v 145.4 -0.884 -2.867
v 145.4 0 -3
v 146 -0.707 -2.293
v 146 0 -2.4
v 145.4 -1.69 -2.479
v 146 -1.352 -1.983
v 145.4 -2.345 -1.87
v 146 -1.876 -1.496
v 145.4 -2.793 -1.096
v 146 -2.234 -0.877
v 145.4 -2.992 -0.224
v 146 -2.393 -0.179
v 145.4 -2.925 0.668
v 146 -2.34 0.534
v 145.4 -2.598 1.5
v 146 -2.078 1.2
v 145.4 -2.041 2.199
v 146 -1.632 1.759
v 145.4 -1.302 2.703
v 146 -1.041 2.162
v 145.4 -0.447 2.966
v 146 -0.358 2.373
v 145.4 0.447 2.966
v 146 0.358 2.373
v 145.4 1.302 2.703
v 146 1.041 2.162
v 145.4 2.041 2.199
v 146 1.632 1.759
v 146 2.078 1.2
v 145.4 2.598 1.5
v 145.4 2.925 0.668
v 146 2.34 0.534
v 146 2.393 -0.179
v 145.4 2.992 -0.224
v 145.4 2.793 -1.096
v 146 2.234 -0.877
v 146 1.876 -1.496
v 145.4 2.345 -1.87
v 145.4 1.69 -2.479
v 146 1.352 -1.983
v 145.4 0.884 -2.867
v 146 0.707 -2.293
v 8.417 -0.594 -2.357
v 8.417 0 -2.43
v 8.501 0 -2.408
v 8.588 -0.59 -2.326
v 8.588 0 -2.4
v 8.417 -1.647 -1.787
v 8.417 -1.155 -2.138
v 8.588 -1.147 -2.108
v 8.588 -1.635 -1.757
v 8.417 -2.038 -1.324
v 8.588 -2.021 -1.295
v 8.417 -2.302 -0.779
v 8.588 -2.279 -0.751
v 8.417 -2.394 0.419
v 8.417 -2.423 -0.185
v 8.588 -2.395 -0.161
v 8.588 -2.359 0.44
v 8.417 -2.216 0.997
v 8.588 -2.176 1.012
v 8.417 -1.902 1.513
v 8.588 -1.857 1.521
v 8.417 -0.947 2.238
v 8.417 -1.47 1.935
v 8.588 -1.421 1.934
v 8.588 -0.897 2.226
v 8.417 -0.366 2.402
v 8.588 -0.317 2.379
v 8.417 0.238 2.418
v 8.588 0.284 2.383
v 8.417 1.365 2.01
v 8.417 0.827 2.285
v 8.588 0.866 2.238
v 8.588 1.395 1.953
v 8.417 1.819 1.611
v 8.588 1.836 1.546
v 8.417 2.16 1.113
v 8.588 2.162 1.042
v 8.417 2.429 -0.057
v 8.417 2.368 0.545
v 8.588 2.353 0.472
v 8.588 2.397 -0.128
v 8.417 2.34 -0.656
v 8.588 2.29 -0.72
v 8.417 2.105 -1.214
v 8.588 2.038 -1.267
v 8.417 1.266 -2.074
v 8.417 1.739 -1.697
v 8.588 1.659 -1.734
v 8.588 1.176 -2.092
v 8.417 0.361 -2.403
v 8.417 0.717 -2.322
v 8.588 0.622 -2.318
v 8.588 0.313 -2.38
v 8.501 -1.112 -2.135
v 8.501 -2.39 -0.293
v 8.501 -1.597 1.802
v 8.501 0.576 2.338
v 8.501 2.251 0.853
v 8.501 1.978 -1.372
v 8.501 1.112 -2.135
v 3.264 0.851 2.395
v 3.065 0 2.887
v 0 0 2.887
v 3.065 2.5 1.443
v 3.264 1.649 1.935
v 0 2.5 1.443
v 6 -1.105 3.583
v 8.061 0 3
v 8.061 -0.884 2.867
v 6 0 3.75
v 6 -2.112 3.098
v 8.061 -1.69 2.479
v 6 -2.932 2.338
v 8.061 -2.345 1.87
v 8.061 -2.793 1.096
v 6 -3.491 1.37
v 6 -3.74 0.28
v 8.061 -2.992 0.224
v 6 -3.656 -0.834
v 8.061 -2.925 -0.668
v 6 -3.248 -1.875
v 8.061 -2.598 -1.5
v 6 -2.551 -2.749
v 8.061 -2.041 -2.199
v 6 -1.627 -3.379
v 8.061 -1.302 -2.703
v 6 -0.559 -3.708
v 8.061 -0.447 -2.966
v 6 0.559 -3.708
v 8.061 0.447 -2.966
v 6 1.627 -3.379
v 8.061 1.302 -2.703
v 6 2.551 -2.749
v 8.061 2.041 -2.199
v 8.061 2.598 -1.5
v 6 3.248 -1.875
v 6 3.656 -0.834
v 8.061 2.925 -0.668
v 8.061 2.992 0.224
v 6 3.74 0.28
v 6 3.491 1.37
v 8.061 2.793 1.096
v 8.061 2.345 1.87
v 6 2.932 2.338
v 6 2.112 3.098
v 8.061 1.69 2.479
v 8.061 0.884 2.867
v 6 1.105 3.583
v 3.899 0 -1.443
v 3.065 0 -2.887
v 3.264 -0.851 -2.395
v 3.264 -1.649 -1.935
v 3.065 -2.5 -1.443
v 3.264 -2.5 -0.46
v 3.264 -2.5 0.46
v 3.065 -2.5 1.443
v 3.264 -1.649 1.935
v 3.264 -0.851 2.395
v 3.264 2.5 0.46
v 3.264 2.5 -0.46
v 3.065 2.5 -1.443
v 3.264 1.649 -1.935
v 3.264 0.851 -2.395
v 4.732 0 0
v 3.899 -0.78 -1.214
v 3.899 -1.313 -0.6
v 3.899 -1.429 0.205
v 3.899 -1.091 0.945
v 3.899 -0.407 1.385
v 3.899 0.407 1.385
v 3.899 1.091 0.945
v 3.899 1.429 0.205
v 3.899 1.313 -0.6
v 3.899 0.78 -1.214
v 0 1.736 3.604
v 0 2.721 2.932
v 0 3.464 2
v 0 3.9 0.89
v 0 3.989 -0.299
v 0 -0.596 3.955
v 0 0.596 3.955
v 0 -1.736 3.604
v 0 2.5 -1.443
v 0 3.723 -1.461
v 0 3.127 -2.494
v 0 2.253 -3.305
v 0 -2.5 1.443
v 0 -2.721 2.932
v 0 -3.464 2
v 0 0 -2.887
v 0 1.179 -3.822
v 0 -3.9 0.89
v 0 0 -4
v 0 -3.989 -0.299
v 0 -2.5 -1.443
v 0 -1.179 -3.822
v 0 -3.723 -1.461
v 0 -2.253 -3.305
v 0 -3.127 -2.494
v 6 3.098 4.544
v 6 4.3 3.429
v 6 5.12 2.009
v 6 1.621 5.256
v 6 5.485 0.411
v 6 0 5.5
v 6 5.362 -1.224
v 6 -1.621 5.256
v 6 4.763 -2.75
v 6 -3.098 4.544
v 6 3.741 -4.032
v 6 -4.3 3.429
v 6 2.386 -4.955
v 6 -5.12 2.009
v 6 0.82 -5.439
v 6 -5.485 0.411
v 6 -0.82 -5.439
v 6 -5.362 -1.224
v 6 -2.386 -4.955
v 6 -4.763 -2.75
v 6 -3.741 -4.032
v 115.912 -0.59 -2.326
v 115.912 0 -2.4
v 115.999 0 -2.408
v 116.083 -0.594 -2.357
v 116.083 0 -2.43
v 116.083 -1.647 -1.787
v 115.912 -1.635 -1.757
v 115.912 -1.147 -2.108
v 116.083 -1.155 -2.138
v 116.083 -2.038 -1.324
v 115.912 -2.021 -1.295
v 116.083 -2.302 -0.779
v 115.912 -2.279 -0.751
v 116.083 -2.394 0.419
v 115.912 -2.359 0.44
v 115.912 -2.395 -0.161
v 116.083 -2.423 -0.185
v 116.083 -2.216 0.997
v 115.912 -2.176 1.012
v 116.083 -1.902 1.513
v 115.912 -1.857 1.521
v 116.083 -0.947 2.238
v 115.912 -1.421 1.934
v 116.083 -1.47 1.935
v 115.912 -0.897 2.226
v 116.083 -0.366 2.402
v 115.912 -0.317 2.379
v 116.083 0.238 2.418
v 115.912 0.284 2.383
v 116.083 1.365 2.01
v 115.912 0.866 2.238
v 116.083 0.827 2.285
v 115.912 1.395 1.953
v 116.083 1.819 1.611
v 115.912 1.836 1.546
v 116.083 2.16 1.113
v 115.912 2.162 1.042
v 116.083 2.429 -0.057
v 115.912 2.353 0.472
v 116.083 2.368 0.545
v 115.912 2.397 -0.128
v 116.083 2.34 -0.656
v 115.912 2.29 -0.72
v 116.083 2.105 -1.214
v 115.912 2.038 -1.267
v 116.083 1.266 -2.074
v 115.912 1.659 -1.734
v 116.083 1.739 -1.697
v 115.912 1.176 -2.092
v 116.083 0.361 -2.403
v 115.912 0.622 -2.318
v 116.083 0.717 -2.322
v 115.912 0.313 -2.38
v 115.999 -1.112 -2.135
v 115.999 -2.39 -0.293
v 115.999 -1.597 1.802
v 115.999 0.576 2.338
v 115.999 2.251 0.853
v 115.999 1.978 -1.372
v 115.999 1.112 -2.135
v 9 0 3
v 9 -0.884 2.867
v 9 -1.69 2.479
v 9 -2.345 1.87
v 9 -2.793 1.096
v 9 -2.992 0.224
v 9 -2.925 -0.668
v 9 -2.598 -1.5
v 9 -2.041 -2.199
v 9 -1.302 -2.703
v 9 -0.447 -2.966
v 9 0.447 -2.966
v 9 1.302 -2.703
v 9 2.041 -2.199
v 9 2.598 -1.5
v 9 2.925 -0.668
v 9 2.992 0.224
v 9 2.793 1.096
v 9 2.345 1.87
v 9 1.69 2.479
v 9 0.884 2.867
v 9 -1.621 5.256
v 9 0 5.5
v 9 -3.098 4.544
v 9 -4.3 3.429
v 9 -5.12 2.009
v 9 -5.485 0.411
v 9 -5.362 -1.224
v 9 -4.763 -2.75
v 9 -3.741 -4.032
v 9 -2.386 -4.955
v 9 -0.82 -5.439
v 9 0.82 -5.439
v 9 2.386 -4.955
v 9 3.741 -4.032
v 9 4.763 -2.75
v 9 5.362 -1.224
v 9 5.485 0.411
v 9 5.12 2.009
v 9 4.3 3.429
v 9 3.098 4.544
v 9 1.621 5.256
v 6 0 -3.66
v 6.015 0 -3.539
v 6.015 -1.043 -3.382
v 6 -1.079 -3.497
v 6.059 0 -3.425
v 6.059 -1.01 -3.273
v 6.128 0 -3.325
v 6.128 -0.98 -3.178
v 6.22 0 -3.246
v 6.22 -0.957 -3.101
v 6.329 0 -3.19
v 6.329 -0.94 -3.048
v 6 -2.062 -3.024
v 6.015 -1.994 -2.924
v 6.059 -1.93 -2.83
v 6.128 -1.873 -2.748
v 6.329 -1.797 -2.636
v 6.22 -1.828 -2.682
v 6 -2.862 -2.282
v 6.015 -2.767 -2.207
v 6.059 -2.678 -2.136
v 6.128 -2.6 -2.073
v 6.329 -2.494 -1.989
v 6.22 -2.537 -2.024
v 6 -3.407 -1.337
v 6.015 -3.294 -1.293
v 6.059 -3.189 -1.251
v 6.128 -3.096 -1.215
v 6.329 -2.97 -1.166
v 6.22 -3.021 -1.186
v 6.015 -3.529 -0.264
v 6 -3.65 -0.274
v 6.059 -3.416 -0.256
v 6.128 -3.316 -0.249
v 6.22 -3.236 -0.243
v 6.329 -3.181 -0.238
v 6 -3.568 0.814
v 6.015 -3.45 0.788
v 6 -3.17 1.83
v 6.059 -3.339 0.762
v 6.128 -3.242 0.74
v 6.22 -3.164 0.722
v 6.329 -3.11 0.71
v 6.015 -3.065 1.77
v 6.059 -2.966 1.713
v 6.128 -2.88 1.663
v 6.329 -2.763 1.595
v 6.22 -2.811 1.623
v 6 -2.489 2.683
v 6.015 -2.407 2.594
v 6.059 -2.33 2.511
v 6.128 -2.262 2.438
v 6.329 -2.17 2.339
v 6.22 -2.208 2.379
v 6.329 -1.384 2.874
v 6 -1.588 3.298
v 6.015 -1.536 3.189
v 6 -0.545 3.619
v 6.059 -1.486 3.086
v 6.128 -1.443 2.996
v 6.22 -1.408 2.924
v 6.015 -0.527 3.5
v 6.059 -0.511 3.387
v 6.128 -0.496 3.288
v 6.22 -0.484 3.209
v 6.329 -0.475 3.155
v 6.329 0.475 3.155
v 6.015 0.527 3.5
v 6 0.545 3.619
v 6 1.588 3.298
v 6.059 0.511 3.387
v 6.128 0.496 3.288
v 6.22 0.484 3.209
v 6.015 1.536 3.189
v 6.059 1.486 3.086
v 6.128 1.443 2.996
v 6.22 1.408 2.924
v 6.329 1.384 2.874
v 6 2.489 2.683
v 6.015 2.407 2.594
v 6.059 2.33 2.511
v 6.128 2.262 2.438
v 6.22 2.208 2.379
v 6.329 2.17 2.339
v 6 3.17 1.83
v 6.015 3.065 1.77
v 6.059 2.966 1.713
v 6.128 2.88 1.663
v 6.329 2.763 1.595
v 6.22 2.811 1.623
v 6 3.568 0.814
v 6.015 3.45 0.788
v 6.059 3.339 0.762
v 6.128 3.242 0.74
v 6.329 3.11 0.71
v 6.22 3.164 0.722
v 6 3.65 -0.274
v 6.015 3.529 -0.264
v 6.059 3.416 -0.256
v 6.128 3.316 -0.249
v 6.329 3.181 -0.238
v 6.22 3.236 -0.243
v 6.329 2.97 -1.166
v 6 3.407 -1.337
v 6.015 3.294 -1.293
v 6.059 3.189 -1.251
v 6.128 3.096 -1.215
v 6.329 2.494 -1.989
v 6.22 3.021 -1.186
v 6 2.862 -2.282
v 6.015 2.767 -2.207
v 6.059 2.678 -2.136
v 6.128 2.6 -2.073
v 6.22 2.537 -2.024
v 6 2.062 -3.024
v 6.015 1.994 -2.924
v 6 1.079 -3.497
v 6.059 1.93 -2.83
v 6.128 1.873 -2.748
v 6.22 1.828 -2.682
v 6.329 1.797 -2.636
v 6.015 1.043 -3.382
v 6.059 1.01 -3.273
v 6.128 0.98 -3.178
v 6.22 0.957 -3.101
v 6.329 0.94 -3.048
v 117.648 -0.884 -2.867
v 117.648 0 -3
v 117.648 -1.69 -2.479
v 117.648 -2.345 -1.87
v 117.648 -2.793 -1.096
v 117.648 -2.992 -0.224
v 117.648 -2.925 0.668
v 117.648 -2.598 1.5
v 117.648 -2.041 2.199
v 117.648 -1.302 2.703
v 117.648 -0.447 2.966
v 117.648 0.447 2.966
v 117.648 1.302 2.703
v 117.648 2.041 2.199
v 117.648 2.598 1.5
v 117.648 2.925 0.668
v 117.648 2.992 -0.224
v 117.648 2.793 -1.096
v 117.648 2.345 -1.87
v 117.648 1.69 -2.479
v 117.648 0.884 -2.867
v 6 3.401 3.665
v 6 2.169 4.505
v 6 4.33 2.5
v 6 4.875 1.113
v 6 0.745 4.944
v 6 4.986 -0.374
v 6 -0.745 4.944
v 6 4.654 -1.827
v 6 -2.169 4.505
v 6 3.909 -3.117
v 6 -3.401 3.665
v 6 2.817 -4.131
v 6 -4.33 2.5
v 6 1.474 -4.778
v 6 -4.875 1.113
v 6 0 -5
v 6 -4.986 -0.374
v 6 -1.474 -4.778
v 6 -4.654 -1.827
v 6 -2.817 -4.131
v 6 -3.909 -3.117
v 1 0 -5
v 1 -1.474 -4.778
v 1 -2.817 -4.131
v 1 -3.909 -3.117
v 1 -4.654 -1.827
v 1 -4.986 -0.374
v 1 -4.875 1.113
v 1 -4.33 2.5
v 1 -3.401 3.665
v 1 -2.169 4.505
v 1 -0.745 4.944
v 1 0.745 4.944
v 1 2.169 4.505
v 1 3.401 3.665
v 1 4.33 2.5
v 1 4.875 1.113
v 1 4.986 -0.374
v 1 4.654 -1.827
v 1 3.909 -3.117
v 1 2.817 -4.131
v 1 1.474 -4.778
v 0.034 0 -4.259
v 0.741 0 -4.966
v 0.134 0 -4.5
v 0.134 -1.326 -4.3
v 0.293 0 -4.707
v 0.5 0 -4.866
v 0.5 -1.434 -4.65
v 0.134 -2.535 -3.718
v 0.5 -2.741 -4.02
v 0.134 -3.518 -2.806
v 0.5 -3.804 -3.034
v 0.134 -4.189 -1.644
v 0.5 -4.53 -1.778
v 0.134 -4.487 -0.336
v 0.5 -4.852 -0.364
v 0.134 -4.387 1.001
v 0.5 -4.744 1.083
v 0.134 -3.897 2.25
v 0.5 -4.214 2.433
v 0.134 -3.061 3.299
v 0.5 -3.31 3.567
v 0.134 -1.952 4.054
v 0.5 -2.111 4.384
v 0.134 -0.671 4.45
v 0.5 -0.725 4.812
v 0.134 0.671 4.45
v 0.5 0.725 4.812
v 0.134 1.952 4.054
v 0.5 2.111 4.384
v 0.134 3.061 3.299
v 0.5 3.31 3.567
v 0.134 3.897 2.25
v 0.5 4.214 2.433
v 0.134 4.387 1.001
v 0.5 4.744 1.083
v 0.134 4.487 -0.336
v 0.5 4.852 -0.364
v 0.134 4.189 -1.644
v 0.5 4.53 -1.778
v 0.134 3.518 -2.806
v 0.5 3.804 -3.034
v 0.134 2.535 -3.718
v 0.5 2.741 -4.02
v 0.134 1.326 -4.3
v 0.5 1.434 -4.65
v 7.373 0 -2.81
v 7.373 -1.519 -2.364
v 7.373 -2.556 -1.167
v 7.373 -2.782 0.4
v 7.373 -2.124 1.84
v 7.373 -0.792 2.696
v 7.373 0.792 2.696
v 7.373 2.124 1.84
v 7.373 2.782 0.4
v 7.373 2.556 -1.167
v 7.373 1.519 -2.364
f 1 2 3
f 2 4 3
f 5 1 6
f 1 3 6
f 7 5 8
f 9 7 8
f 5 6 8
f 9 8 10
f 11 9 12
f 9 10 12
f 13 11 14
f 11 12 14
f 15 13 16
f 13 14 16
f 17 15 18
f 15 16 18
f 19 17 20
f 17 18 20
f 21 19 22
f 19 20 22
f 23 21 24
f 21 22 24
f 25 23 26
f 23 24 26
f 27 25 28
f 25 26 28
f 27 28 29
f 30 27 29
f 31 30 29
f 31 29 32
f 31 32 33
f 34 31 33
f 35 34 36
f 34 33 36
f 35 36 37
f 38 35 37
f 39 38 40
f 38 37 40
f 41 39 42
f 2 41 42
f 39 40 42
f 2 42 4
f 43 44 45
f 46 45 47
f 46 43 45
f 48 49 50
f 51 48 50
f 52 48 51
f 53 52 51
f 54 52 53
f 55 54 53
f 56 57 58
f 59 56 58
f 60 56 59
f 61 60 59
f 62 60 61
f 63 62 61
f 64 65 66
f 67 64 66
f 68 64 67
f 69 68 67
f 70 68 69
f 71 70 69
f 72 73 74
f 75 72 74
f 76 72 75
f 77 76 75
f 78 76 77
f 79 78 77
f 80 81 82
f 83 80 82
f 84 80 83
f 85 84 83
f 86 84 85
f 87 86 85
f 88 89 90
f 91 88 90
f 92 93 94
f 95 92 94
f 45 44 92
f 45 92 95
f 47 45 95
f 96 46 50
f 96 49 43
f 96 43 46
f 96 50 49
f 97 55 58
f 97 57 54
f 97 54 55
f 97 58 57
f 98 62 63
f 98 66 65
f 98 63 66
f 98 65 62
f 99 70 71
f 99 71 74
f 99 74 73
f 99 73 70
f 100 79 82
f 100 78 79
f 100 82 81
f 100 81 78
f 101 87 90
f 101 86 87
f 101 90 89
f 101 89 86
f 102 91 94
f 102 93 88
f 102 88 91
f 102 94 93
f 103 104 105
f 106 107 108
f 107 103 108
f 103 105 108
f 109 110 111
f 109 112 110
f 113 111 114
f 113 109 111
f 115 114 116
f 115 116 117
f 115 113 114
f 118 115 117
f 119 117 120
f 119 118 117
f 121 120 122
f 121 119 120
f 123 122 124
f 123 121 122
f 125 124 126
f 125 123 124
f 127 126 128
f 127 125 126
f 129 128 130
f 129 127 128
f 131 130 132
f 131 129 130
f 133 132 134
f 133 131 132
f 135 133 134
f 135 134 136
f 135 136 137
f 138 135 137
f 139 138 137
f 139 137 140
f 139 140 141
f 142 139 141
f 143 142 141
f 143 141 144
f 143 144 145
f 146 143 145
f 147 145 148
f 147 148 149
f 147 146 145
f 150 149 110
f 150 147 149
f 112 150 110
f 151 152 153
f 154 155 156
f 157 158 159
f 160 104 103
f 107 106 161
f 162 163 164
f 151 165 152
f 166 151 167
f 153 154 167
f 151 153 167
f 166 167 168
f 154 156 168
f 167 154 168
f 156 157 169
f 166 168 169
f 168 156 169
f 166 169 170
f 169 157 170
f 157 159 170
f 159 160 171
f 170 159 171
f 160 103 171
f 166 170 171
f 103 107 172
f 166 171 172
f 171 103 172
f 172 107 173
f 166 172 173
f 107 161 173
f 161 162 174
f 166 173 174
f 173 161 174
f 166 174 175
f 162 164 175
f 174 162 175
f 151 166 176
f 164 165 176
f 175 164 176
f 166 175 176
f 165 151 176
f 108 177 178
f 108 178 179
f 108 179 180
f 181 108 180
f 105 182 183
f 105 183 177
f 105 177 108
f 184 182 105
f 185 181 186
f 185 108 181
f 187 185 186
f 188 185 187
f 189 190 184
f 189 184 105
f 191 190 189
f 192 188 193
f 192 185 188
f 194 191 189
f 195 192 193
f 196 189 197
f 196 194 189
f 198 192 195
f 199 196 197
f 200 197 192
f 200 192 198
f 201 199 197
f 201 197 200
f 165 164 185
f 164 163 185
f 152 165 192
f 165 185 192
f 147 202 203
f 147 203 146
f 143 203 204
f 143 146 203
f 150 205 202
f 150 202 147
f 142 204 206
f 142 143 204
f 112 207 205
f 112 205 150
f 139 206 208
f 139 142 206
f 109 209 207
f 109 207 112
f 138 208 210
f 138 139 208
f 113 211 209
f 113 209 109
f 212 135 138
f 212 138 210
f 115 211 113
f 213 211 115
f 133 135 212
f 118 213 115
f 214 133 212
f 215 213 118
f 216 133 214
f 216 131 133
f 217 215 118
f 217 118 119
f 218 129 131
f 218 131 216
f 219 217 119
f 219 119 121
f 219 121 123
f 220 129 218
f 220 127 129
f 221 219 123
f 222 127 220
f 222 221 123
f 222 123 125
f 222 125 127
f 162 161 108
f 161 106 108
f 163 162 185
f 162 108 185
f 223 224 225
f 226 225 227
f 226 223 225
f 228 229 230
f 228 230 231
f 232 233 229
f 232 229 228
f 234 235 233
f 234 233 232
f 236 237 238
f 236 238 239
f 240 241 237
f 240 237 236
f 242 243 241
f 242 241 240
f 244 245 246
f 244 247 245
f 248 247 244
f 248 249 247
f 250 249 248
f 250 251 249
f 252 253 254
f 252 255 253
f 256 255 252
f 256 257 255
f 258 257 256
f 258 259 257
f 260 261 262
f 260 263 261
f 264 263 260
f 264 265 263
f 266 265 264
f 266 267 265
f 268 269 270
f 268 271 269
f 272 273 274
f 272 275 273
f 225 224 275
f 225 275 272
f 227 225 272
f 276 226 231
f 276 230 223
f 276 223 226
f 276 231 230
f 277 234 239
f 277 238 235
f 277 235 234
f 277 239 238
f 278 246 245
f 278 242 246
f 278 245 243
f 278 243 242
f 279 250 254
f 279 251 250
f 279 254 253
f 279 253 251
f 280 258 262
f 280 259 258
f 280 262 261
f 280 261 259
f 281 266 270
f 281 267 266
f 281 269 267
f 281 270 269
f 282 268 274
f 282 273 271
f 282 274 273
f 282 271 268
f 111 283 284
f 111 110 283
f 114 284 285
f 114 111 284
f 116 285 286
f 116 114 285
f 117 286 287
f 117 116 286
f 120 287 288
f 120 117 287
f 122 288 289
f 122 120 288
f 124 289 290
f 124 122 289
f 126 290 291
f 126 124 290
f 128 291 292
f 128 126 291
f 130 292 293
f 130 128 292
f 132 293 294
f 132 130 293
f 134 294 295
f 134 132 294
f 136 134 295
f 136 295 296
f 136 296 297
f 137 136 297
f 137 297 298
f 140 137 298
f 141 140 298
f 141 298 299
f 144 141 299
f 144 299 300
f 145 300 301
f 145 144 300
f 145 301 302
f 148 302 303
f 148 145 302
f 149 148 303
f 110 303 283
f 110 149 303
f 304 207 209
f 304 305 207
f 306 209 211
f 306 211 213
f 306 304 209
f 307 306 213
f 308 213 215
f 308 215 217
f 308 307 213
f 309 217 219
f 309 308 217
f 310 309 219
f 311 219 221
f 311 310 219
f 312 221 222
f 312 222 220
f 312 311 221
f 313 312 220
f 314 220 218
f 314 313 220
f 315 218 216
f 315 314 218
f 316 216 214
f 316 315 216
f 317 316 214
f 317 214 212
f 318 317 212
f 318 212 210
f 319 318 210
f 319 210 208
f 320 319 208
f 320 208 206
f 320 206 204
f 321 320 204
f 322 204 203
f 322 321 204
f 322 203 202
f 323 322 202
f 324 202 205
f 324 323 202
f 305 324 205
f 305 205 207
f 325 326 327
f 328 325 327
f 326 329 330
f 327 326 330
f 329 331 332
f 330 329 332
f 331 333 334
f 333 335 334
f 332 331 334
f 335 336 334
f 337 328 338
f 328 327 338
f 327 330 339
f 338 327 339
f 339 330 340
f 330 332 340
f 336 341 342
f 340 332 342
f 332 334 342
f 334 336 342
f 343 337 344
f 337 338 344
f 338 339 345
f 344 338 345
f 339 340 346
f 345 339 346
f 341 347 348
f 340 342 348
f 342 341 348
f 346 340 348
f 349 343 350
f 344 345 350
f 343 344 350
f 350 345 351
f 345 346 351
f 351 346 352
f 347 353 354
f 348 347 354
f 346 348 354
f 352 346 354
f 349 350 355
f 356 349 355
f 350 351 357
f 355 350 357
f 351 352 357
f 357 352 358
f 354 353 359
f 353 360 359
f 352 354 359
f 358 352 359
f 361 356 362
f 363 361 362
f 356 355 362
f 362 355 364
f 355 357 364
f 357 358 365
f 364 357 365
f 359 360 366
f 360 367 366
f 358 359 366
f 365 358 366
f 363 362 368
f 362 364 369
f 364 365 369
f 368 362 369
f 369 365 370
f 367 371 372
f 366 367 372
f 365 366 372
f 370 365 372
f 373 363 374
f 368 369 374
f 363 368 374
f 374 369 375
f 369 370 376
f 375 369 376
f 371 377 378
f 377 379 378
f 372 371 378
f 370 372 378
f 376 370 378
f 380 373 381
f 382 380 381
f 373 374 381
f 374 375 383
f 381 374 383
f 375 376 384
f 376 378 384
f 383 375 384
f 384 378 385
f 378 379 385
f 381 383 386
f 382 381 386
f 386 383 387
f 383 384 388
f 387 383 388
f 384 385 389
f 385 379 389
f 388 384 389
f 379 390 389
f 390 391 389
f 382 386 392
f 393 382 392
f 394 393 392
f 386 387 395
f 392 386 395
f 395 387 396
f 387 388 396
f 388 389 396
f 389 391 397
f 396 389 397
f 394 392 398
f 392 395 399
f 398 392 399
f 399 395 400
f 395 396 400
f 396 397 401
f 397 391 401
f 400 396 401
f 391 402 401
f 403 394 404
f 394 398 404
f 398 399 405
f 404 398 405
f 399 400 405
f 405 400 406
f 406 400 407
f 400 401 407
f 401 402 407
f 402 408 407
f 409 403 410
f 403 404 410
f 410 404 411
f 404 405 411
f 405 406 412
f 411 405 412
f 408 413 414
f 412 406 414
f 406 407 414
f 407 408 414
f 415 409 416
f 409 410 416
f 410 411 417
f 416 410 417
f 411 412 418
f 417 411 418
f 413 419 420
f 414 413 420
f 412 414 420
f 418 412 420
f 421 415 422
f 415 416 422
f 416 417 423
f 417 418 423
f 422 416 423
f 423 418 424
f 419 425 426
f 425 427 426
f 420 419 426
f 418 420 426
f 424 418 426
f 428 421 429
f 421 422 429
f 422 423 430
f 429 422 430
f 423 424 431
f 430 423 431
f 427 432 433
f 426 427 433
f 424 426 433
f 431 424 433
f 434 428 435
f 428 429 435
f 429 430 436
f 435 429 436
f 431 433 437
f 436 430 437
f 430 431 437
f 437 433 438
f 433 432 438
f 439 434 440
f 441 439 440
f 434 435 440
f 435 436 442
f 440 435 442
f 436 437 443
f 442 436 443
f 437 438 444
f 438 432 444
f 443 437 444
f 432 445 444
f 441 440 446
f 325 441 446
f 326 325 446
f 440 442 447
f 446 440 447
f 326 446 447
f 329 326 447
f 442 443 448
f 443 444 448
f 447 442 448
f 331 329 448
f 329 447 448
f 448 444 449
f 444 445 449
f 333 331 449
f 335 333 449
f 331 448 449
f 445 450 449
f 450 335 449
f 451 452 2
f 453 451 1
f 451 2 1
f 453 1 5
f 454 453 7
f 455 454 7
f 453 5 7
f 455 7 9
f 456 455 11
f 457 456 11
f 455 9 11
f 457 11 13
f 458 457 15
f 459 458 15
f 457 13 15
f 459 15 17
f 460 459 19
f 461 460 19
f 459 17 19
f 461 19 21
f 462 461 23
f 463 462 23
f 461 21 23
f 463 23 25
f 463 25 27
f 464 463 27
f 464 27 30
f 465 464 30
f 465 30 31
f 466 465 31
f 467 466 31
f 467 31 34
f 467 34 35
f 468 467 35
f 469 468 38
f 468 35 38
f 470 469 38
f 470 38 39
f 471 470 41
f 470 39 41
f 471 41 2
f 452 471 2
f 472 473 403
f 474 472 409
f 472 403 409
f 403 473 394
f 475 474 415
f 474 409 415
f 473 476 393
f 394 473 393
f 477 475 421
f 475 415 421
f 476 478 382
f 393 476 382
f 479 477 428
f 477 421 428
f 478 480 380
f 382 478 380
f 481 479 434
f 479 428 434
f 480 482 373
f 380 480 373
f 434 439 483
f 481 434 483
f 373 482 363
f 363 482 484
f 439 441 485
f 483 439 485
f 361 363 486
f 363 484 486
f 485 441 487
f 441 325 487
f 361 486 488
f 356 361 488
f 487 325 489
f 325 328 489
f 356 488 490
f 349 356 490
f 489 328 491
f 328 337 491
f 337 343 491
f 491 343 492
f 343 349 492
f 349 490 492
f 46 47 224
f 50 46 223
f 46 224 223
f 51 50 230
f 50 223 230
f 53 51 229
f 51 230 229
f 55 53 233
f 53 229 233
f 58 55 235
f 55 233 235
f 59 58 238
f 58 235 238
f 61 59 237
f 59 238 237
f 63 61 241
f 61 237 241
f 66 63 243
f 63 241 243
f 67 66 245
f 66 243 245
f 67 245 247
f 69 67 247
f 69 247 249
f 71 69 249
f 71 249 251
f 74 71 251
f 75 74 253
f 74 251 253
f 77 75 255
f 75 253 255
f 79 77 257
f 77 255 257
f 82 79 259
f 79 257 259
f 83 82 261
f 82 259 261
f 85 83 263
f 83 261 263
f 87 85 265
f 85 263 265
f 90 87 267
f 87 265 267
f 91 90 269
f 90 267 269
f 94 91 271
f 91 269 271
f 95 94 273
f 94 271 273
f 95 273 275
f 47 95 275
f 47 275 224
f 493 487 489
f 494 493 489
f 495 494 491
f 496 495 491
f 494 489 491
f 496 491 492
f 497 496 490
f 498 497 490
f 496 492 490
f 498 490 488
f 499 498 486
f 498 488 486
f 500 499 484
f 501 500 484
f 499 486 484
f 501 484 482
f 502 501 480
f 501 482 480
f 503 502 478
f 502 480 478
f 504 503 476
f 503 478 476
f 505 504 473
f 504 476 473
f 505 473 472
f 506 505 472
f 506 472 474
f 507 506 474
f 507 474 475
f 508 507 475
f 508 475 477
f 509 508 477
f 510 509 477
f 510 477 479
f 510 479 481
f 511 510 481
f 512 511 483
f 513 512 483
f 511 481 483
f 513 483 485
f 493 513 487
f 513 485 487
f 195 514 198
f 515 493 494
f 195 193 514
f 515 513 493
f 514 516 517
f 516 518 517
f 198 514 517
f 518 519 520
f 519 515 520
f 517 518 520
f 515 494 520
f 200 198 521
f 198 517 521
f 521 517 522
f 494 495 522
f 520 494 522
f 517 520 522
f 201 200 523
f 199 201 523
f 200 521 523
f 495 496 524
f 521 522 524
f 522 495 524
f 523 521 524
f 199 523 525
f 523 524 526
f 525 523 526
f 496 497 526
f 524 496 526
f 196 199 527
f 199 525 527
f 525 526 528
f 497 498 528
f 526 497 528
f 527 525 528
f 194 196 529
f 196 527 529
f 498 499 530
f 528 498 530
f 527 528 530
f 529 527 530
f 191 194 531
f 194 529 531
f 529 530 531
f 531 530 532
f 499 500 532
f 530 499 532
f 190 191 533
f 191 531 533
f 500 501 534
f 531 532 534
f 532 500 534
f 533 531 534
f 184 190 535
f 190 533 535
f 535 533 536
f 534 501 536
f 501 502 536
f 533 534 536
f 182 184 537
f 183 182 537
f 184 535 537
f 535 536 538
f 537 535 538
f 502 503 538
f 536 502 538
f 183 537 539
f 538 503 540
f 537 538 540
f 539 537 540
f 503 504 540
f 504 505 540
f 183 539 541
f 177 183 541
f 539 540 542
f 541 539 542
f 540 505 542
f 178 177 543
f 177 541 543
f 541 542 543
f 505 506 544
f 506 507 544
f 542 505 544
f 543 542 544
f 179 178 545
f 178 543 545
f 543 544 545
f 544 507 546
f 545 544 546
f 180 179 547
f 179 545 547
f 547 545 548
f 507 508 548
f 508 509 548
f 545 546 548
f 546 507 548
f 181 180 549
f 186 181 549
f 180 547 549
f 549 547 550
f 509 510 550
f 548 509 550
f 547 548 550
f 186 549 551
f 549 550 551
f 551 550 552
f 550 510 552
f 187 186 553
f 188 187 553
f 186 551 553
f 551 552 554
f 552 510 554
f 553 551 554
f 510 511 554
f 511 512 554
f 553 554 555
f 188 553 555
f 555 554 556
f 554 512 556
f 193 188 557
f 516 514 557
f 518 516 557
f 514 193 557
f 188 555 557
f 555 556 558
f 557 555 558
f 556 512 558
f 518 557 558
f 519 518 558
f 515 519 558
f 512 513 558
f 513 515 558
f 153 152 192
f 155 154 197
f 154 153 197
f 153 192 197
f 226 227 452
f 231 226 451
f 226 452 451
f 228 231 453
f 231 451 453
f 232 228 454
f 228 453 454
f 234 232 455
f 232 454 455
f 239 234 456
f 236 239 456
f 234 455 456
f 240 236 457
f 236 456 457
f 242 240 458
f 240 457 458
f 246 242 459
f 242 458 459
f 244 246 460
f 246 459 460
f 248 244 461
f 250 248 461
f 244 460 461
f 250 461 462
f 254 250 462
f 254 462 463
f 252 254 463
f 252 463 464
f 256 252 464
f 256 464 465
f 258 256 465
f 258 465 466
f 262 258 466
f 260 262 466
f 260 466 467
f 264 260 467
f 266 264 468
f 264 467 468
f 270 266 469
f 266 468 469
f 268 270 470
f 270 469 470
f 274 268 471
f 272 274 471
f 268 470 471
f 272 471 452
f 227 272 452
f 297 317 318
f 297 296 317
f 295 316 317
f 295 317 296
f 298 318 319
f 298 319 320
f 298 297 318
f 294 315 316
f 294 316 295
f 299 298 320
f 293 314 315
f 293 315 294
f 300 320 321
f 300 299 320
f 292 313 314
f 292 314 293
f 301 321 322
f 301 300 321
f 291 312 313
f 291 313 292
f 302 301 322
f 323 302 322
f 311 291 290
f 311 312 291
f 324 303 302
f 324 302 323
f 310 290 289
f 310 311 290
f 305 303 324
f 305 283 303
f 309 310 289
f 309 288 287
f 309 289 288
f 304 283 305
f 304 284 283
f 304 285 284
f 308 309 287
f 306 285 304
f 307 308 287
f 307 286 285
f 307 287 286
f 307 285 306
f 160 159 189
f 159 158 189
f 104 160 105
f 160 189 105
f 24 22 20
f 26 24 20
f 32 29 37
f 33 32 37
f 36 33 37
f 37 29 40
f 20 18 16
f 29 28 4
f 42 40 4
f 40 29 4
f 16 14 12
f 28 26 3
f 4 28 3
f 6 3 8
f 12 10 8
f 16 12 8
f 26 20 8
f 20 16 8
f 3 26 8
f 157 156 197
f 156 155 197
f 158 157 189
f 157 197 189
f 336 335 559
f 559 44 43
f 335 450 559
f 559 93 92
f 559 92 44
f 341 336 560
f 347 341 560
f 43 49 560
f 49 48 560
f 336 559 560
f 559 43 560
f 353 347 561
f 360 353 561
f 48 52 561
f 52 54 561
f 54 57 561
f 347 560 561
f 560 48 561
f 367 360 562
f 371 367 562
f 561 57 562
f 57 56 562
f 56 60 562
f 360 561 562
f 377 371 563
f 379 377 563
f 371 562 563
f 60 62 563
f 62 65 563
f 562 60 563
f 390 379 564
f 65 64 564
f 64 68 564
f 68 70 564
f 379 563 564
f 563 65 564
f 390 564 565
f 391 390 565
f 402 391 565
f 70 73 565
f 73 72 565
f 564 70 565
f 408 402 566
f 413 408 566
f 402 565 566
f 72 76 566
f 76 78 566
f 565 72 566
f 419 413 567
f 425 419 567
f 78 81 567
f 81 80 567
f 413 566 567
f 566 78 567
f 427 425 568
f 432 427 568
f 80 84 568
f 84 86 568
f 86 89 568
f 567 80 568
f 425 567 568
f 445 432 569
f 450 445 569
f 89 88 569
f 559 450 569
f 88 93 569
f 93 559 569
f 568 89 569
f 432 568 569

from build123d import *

# Parameters (mm, degrees)
AUFSATZ_LINEAR_AUSTRAGEN1_REACH = 148.171
SKIZZE2_R                       = 3
VERRUNDUNG1_R                   = 1
VERRUNDUNG2_R                   = 0.5


with BuildPart() as part:
    # Skizze1 → Rotation1 (revolve)
    with BuildSketch(Plane.XY, mode=Mode.PRIVATE) as rotation1_sk:
        Polygon((0, 5), (6, 5), (6, 3.309925586), (8.5, 2.4), (116, 2.4), (117.648486452, 3), (145.4, 3), (146, 2.4), (146, 0), (4.732050808, 0), (3, 3), (0, 3), align=None)
    revolve(rotation1_sk.sketch.rotate(Axis((0, 0, 0), (-1, 0, 0)), 90), axis=Axis((0, 0, 0), (-1, 0, 0)))

    # Aufsatz-Linear austragen1: up to this cone (the profile starts inside it)
    aufsatz_linear_austragen1_end = Plane(origin=(0, 0, 0), z_dir=(-1, 0, 0)).offset(-4.732049808) * Cone(1.732e-06, 279.898030457, 161.59920223, align=(Align.CENTER, Align.CENTER, Align.MIN), mode=Mode.PRIVATE)
    # Skizze2 → Aufsatz-Linear austragen1 (add, up to the surface)
    with BuildSketch(Plane.ZY, mode=Mode.PRIVATE) as aufsatz_linear_austragen1_sk1:
        with Locations(Location((0, 0, 0), (0, 0, 180))):
            Circle(SKIZZE2_R)
        Polygon((-2.886751346, 0), (-1.443375673, -2.5), (1.443375673, -2.5), (2.886751346, 0), (1.443375673, 2.5), (-1.443375673, 2.5), align=None, mode=Mode.SUBTRACT)
    aufsatz_linear_austragen1_tool1 = extrude(aufsatz_linear_austragen1_sk1.sketch, amount=-AUFSATZ_LINEAR_AUSTRAGEN1_REACH, mode=Mode.PRIVATE) & aufsatz_linear_austragen1_end
    add(aufsatz_linear_austragen1_tool1.solids().sort_by_distance((0, 0, 2.915147))[0])

    # Verrundung1
    verrundung1_edges = [part.edges().sort_by_distance(p)[0] for p in [
        (0, 0, 5),
    ]]
    fillet(verrundung1_edges, radius=VERRUNDUNG1_R)

    # Verrundung2
    verrundung2_edges = [part.edges().sort_by_distance(p)[0] for p in [
        (116, 0, 2.4),
        (8.5, 0, 2.4),
        (6, 0, 3.309925586),
    ]]
    fillet(verrundung2_edges, radius=VERRUNDUNG2_R)


with BuildPart() as body_2:
    # Skizze3 → Rotation2 (revolve)
    with BuildSketch(Plane.XY, mode=Mode.PRIVATE) as rotation2_sk:
        Polygon((6, 5.5), (9, 5.5), (9, 3), (8.060608065, 3), (6, 3.75), align=None)
    revolve(rotation2_sk.sketch.rotate(Axis((0, 0, 0), (1, 0, 0)), 90), axis=Axis((0, 0, 0), (1, 0, 0)))


solid = Compound([part.part, body_2.part])
